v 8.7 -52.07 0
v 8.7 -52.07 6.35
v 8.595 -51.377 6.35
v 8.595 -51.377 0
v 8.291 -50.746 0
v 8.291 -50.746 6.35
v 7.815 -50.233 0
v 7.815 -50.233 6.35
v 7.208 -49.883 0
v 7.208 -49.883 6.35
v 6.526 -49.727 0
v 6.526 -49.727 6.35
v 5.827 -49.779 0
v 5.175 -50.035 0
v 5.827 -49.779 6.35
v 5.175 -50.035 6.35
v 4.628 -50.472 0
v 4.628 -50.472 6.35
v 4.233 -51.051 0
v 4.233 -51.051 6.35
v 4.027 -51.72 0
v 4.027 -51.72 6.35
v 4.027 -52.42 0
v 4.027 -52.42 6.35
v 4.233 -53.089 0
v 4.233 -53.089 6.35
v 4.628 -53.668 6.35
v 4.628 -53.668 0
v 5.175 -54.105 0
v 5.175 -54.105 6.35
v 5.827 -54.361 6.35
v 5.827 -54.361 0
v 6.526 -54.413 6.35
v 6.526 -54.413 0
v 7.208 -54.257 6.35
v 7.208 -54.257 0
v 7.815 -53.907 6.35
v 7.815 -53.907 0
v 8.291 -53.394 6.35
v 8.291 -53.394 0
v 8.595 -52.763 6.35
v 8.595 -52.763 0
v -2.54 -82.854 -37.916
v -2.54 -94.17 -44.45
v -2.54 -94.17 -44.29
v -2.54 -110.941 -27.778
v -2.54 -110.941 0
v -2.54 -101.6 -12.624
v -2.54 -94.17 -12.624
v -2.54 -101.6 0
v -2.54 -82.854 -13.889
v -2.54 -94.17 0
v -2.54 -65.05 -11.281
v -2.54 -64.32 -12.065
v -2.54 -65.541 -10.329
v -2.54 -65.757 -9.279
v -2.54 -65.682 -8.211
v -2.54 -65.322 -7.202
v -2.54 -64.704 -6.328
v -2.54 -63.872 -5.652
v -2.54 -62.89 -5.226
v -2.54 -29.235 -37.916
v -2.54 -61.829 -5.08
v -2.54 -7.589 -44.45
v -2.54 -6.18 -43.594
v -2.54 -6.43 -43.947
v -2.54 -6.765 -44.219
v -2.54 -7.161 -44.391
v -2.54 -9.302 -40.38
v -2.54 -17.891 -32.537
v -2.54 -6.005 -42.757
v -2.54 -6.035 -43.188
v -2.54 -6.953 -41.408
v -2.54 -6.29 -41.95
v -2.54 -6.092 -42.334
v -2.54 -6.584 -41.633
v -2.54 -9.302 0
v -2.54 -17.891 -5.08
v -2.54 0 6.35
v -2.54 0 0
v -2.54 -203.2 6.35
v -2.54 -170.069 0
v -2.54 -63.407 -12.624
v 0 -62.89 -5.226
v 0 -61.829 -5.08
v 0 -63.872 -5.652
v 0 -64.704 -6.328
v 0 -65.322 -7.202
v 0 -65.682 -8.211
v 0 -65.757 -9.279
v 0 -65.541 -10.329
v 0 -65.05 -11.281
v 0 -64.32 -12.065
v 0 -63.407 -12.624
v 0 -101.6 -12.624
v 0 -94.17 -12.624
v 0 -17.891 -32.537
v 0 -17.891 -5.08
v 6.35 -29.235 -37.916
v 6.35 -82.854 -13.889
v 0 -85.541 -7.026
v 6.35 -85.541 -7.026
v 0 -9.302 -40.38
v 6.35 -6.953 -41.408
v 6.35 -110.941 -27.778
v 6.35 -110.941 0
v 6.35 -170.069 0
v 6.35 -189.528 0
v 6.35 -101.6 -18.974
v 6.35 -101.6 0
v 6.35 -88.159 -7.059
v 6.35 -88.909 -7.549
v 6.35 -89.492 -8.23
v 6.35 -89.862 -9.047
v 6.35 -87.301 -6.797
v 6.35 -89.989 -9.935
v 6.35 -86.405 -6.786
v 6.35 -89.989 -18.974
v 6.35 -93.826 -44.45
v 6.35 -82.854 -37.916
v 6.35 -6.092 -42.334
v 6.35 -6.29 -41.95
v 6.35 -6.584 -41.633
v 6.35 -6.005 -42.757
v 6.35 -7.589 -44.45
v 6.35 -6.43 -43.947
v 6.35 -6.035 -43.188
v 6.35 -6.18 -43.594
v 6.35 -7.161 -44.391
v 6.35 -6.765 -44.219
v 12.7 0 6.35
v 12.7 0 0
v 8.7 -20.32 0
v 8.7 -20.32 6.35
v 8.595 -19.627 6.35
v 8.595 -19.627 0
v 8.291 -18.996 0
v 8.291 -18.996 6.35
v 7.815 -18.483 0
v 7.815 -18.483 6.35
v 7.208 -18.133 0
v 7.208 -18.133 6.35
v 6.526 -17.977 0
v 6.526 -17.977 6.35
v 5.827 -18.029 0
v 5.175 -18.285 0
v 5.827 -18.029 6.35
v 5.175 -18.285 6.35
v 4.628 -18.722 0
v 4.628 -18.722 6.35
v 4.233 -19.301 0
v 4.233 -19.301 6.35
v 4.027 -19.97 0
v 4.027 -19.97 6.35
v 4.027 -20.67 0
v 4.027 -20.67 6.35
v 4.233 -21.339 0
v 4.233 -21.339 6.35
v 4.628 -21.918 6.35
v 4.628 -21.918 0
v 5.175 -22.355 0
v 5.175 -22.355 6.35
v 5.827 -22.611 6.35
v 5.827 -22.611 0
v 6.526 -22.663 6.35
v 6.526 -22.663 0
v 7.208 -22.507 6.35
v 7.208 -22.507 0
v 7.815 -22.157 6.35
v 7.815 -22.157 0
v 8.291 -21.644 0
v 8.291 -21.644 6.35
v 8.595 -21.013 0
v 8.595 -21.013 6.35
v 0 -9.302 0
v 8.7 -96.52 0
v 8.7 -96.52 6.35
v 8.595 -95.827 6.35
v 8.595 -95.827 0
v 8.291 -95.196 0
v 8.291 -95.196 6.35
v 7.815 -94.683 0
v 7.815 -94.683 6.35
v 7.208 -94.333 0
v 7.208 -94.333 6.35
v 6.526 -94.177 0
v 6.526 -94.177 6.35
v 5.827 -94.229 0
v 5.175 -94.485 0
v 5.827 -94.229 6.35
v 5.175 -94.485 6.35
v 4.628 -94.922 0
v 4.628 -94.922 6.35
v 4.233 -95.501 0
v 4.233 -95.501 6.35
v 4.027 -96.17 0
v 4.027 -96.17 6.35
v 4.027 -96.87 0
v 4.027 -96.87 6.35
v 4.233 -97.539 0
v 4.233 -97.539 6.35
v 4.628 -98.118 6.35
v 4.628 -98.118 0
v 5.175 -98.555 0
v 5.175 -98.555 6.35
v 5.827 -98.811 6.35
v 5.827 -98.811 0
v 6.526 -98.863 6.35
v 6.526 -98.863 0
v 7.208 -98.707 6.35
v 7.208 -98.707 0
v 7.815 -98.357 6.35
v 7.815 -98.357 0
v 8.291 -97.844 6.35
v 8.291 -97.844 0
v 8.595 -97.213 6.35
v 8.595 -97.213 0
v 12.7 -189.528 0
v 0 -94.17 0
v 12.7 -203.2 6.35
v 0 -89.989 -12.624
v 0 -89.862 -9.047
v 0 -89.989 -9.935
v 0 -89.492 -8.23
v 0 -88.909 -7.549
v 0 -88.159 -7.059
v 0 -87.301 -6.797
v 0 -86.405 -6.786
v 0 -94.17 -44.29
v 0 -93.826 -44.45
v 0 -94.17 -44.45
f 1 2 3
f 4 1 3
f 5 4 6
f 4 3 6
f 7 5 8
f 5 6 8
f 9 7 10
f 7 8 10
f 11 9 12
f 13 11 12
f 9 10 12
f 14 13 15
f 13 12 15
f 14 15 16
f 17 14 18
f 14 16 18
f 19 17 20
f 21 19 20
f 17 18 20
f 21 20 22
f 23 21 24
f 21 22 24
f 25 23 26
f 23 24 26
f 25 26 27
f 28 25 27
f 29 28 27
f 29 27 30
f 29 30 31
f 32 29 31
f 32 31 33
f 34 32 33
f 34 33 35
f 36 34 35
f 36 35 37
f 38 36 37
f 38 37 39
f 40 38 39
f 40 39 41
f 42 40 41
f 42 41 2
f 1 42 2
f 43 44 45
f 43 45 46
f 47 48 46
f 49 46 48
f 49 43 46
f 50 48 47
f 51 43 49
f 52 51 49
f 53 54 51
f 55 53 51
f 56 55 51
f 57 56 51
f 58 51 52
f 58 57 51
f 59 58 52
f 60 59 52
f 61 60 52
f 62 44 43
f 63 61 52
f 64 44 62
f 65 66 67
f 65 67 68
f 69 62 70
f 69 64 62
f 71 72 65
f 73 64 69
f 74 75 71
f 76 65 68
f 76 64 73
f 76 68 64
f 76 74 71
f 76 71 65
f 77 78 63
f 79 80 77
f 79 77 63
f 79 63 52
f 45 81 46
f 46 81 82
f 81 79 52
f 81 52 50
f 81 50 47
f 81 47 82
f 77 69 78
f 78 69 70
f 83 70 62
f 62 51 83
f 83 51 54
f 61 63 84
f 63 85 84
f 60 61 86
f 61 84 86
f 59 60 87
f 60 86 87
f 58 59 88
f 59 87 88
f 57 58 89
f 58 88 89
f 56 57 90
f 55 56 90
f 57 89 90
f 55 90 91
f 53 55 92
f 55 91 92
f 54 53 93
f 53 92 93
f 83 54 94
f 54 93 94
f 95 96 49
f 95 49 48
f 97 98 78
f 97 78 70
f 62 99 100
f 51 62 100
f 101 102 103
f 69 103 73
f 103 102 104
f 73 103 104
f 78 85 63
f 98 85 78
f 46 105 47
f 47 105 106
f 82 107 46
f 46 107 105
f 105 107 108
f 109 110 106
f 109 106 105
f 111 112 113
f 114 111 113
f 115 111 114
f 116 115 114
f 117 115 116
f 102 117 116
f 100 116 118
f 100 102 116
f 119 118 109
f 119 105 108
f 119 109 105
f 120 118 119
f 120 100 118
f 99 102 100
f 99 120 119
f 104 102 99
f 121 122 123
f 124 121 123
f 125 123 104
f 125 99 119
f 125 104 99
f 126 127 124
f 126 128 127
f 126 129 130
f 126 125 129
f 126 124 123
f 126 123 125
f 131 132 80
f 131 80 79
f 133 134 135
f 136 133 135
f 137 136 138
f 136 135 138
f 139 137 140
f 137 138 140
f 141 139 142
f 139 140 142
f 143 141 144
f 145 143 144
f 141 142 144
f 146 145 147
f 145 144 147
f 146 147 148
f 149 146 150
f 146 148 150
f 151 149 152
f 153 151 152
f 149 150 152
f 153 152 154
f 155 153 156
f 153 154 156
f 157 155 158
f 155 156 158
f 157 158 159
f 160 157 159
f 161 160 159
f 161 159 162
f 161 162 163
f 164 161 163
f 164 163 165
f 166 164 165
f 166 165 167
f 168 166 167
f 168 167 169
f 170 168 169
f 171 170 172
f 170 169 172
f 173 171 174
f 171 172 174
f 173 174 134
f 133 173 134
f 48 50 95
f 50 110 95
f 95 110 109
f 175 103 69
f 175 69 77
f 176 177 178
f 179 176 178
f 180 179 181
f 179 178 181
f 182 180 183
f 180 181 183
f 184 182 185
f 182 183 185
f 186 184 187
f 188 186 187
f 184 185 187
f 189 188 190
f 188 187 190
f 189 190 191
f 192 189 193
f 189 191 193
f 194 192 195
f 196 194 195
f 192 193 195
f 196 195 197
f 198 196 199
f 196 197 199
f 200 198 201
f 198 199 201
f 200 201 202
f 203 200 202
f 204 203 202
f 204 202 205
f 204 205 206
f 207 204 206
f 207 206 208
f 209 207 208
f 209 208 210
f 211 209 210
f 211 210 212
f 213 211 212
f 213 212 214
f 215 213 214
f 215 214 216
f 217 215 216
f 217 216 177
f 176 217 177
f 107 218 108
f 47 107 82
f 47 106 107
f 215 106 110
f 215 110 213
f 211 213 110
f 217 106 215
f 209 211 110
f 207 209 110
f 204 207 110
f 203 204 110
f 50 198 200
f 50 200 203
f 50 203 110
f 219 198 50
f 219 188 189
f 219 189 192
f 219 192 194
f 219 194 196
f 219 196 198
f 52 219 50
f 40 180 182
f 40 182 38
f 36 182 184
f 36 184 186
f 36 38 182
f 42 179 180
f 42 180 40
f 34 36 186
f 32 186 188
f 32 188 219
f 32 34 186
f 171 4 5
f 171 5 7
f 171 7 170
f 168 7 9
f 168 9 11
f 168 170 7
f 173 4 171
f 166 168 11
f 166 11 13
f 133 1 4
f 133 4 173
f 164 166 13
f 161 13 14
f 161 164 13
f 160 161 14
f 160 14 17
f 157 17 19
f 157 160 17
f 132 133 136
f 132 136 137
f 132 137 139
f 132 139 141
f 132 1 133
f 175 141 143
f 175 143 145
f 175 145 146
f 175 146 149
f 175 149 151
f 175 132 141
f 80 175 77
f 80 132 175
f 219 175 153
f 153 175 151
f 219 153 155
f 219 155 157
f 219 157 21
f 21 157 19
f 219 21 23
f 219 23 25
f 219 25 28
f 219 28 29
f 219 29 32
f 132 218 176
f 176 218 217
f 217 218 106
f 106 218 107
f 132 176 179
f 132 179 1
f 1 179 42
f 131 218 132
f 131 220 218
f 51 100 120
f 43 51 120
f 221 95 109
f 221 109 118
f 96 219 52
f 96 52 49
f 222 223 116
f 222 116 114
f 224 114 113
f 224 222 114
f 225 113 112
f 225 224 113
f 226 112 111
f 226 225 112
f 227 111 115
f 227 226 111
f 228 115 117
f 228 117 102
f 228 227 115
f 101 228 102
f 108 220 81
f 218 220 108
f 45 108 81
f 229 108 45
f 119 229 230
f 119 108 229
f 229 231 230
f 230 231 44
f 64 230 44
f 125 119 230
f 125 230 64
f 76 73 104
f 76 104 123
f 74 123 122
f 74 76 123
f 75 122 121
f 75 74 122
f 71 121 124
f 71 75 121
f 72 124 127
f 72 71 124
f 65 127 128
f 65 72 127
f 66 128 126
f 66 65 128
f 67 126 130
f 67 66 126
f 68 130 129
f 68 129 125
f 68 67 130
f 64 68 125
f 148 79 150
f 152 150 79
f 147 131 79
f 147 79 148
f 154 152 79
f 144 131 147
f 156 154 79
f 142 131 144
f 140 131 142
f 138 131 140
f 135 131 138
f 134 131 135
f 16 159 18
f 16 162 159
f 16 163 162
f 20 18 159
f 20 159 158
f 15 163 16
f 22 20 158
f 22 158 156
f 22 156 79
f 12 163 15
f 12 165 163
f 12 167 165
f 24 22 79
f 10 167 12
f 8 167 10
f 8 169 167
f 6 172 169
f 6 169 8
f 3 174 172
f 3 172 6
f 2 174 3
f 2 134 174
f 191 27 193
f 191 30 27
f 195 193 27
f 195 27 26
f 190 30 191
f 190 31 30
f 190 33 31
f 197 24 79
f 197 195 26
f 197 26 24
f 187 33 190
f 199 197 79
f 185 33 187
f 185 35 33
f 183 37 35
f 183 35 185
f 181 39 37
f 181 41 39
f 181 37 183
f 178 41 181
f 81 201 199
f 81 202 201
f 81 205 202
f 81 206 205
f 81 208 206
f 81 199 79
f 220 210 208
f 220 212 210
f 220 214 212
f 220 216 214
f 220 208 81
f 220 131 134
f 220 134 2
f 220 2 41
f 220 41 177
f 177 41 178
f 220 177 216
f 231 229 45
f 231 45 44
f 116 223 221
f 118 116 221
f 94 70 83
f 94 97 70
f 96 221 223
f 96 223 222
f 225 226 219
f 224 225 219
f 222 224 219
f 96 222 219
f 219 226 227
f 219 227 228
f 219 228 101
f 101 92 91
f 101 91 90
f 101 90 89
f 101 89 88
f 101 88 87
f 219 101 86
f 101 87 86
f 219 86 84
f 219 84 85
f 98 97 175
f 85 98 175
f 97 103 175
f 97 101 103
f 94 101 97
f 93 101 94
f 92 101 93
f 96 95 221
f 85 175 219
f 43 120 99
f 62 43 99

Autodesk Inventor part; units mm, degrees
ref_plane "YZ Plane" through (0, 0, 0) normal (1, 0, 0) x (0, 1, 0)
ref_plane "XZ Plane" through (0, 0, 0) normal (0, 1, 0) x (-1, 0, 0)
ref_plane "Work Plane1" through (12.7, -42.953, -13.3823) normal (1, 0, 0) x (0, 1, 0)
sketch "Sketch1" plane through (12.7, -42.953, -13.3823) normal (1, 0, 0) x (0, 1, 0)
  line L0 (-54.71, 8.3023) -> (-54.71, 13.3823) projected
  line L1 (-54.71, 8.3023) -> (-47.0356, 8.3023) projected
  line L2 (-47.0356, 8.3023) -> (42.953, -31.0677) projected
  line L3 (42.953, -31.0677) -> (42.953, -10.5432) projected
  line L4 (42.953, -10.5432) -> (42.953, -7.1422) projected
  line L5 (42.953, -7.1422) -> (42.953, 13.3823) projected
  line L6 (42.953, 13.3823) -> (-54.71, 13.3823) projected
  line L7 (-18.8756, 8.3023) -> (29.7141, 8.3023) projected
  arc A0 (33.6511, 4.3653) -> (29.7141, 8.3023) centre (29.7141, 4.3653) ccw projected
  line L8 (33.6511, 4.3653) -> (33.6511, -16.8927) projected
  arc A1 (28.1361, -20.4997) -> (33.6511, -16.8927) centre (29.7141, -16.8927) ccw projected
  line L9 (28.1361, -20.4997) -> (-20.4536, 0.7583) projected
  arc A2 (-18.8756, 8.3023) -> (-20.4536, 0.7583) centre (-18.8756, 4.3653) ccw projected
  line L10 (-58.647, 13.3823) -> (-58.647, 8.3023) projected
  line L11 (-58.647, 13.3823) -> (-54.71, 13.3823) projected
  line L12 (-54.71, 8.3023) -> (-58.647, 8.3023) projected
  line L13 (42.953, 13.3823) -> (42.953, 19.7323)
  line L14 (42.953, 19.7323) -> (-160.247, 19.7323)
  line L15 (-160.247, 19.7323) -> (-50.8728, -31.0677)
  line L16 (-50.8728, -31.0677) -> (42.953, -31.0677)
  line L17 (42.953, -31.0677) -> (-47.0356, 8.3023)
  line L18 (-47.0356, 8.3023) -> (-47.0356, 0.7583)
  line L19 (-47.0356, 0.7583) -> (-58.647, 0.7583)
  line L20 (-58.647, 0.7583) -> (-58.647, 13.3823)
  line L21 (-58.647, 13.3823) -> (42.953, 13.3823)
  dimension "d0" = 6.35
  dimension "d1" = 203.2
ref_plane "Work Plane2" through (0, -97.663, -42.3664) normal (-1, 0, 0) x (0, 0, 1)
extrude "Extrusion1" add sketch "Sketch1" against normal up to surface (12.7 mm away) contours L11 L10 L20 L19 L18 L2 L16 L15 L14 L13 L6
sketch "Sketch2" plane through (12.7, -203.2, 6.35) normal (0, 0, 1) x (1, 0, 0)
  circle A0 centre (-6.35, 182.88) radius 2.3495 projected
  circle A1 centre (-6.35, 151.13) radius 2.3495 projected
  circle A2 centre (-6.35, 106.68) radius 2.3495 projected
  point P0 (-12.7, 203.2)
extrude "Extrusion2" cut sketch "Sketch2" against normal blind 17.4625
sketch "Sketch3" plane through (0, -203.2, 6.35) normal (-1, 0, 0) x (0, 0, 1)
  line L0 (0, 203.2) -> (0, 0) projected
  line L1 (-6.35, 203.2) -> (0, 203.2) projected
  line L2 (-6.35, 101.6) -> (-6.35, 203.2) projected
  line L3 (-18.9739, 101.6) -> (-6.35, 101.6) projected
  line L4 (-18.9739, 113.2114) -> (-18.9739, 101.6) projected
  line L5 (-11.43, 113.2114) -> (-18.9739, 113.2114) projected
  line L6 (-50.8, 203.2) -> (-11.43, 113.2114) projected
  line L7 (-50.8, 109.3742) -> (-50.8, 203.2) projected
  line L8 (0, 0) -> (-50.8, 109.3742) projected
  line L9 (-35.8, 198.4375) -> (-35.8, 203.2) projected
  line L10 (-15.367, 193.8982) -> (-36.625, 193.8982) projected
  line L11 (0, 109.0295) -> (0, 104.3305) projected
  line L12 (-50.8, 193.8982) -> (0, 193.8982)
  line L13 (0, 193.8982) -> (0, 109.0295)
  line L14 (0, 109.0295) -> (-50.8, 109.0295)
  line L15 (-50.8, 109.0295) -> (-50.8, 193.8982)
extrude "Extrusion3" add sketch "Sketch3" along normal blind 2.54 contours L0 L12 L2 L1 | L0 L14 L2 L12 | L0 L8 L14 L4 L3 L2 | L2 L14 L4 L5 L6 L12 L10 | L14 L8 L7 L12 L6 L5 L4 | L14 L15 L8 | L12 L7 L6
sketch "Sketch4" plane through (0, -203.2, 6.35) normal (1, 0, 0) x (0, 0, -1)
  line L0 (11.43, 141.3714) -> (11.43, 189.9612) projected
  line L1 (11.43, 105.537) -> (6.35, 105.537) projected
  line L2 (11.43, 105.537) -> (11.43, 113.2114) projected
  line L3 (11.43, 113.2114) -> (50.8, 203.2) projected
  line L4 (50.8, 203.2) -> (30.2755, 203.2) projected
  line L5 (30.2755, 203.2) -> (26.8745, 203.2) projected
  line L6 (26.8745, 203.2) -> (6.35, 203.2) projected
  line L7 (6.35, 203.2) -> (6.35, 105.537) projected
  line L8 (11.43, 141.3714) -> (11.43, 189.9612) projected
  arc A0 (15.367, 193.8982) -> (11.43, 189.9612) centre (15.367, 189.9612) ccw projected
  line L9 (15.367, 193.8982) -> (36.625, 193.8982) projected
  arc A1 (40.2319, 188.3831) -> (36.625, 193.8982) centre (36.625, 189.9612) ccw projected
  line L10 (40.2319, 188.3831) -> (18.9739, 139.7934) projected
  arc A2 (11.43, 141.3714) -> (18.9739, 139.7934) centre (15.367, 141.3714) ccw projected
  line L11 (11.43, 185.3087) -> (38.8868, 185.3087)
extrude "Extrusion4" cut sketch "Sketch4" against normal blind 2.54 contours L0 L11 L10 A2
fillet "Fillet1" radius 3.175 1 edges at (6.35, -89.9886, -5.08)
fillet "Fillet2" radius 1.5875 1 edges at (5.08, 0, -44.45)
sketch "Sketch5" plane through (12.7, -42.953, -13.3823) normal (1, 0, 0) x (0, 0, -1)
  arc A0 (31.0677, 35.3637) -> (28.0258, 36) centre (29.4802, 35.3637) ccw projected
  line L0 (28.0258, 36) -> (-6.3564, -42.588) projected
  arc A1 (-6.3564, -42.588) -> (-3.4476, -47.0356) centre (-3.4476, -43.8606) ccw projected
  line L1 (-3.4476, -47.0356) -> (-0.7583, -47.0356) projected
  line L2 (-0.7583, -47.0356) -> (-0.7583, -58.647) projected
  line L3 (-0.7583, -58.647) -> (-13.3823, -58.647) projected
  line L4 (-13.3823, -58.647) -> (-13.3823, 42.953) projected
  line L5 (-13.3823, 42.953) -> (-19.7323, 42.953) projected
  line L6 (-19.7323, 42.953) -> (-19.7323, -160.247) projected
  line L7 (-19.7323, -160.247) -> (31.0677, -50.8728) projected
  line L8 (31.0677, -50.8728) -> (31.0677, 35.3637) projected
  line L9 (-13.3823, -127.1164) -> (-13.3823, -67.9876)
  line L10 (-13.3823, -127.1164) -> (14.3959, -67.9876)
  line L11 (14.3959, -67.9876) -> (-13.3823, -67.9876)
  line L12 (2.8311, -39.9014) -> (24.5341, -39.9014)
  line L13 (24.5341, -39.9014) -> (24.5341, 13.7178)
  line L14 (24.5341, 13.7178) -> (0.5068, -39.9014)
  line L15 (0.5068, -39.9014) -> (2.8311, -39.9014)
extrude "Extrusion5" cut sketch "Sketch5" against normal blind 17.78 contours L9 L11 L10 | L15 L14 L13 L12
chamfer "Chamfer1" distance 12.7 angle 45 1 edges at (12.7, -95.7943, -12.6239)
ref_plane "Work Plane3" through (6.35, 0, 0) normal (0, -1, 0) x (1, 0, 0)
sketch "Sketch6" plane through (12.7, -110.9406, -27.7782) normal (0, -1, 0) x (1, 0, 0)
  line L0 (-15.24, 34.1282) -> (-15.24, 27.7782) projected
  line L1 (-15.24, 34.1282) -> (-15.24, 27.7782)
  line L2 (0, 27.7782) -> (0, 0) projected
  line L3 (0, -16.6718) -> (-12.7, -16.6718) projected
  line L4 (0, 27.7782) -> (-6.35, 27.7782)
  line L5 (-6.35, 27.7782) -> (-6.35, -16.6718)
  line L6 (-6.35, -16.6718) -> (0, -16.6718)
  line L7 (0, -16.6718) -> (0, 27.7782)
  point P0 (-12.7, 27.7782)
  dimension "d17" = 6.35
  dimension "d18" = 6.35
extrude "Extrusion6" cut sketch "Sketch6" along normal mid plane 211.455
properties part number "PlateSpacer"
